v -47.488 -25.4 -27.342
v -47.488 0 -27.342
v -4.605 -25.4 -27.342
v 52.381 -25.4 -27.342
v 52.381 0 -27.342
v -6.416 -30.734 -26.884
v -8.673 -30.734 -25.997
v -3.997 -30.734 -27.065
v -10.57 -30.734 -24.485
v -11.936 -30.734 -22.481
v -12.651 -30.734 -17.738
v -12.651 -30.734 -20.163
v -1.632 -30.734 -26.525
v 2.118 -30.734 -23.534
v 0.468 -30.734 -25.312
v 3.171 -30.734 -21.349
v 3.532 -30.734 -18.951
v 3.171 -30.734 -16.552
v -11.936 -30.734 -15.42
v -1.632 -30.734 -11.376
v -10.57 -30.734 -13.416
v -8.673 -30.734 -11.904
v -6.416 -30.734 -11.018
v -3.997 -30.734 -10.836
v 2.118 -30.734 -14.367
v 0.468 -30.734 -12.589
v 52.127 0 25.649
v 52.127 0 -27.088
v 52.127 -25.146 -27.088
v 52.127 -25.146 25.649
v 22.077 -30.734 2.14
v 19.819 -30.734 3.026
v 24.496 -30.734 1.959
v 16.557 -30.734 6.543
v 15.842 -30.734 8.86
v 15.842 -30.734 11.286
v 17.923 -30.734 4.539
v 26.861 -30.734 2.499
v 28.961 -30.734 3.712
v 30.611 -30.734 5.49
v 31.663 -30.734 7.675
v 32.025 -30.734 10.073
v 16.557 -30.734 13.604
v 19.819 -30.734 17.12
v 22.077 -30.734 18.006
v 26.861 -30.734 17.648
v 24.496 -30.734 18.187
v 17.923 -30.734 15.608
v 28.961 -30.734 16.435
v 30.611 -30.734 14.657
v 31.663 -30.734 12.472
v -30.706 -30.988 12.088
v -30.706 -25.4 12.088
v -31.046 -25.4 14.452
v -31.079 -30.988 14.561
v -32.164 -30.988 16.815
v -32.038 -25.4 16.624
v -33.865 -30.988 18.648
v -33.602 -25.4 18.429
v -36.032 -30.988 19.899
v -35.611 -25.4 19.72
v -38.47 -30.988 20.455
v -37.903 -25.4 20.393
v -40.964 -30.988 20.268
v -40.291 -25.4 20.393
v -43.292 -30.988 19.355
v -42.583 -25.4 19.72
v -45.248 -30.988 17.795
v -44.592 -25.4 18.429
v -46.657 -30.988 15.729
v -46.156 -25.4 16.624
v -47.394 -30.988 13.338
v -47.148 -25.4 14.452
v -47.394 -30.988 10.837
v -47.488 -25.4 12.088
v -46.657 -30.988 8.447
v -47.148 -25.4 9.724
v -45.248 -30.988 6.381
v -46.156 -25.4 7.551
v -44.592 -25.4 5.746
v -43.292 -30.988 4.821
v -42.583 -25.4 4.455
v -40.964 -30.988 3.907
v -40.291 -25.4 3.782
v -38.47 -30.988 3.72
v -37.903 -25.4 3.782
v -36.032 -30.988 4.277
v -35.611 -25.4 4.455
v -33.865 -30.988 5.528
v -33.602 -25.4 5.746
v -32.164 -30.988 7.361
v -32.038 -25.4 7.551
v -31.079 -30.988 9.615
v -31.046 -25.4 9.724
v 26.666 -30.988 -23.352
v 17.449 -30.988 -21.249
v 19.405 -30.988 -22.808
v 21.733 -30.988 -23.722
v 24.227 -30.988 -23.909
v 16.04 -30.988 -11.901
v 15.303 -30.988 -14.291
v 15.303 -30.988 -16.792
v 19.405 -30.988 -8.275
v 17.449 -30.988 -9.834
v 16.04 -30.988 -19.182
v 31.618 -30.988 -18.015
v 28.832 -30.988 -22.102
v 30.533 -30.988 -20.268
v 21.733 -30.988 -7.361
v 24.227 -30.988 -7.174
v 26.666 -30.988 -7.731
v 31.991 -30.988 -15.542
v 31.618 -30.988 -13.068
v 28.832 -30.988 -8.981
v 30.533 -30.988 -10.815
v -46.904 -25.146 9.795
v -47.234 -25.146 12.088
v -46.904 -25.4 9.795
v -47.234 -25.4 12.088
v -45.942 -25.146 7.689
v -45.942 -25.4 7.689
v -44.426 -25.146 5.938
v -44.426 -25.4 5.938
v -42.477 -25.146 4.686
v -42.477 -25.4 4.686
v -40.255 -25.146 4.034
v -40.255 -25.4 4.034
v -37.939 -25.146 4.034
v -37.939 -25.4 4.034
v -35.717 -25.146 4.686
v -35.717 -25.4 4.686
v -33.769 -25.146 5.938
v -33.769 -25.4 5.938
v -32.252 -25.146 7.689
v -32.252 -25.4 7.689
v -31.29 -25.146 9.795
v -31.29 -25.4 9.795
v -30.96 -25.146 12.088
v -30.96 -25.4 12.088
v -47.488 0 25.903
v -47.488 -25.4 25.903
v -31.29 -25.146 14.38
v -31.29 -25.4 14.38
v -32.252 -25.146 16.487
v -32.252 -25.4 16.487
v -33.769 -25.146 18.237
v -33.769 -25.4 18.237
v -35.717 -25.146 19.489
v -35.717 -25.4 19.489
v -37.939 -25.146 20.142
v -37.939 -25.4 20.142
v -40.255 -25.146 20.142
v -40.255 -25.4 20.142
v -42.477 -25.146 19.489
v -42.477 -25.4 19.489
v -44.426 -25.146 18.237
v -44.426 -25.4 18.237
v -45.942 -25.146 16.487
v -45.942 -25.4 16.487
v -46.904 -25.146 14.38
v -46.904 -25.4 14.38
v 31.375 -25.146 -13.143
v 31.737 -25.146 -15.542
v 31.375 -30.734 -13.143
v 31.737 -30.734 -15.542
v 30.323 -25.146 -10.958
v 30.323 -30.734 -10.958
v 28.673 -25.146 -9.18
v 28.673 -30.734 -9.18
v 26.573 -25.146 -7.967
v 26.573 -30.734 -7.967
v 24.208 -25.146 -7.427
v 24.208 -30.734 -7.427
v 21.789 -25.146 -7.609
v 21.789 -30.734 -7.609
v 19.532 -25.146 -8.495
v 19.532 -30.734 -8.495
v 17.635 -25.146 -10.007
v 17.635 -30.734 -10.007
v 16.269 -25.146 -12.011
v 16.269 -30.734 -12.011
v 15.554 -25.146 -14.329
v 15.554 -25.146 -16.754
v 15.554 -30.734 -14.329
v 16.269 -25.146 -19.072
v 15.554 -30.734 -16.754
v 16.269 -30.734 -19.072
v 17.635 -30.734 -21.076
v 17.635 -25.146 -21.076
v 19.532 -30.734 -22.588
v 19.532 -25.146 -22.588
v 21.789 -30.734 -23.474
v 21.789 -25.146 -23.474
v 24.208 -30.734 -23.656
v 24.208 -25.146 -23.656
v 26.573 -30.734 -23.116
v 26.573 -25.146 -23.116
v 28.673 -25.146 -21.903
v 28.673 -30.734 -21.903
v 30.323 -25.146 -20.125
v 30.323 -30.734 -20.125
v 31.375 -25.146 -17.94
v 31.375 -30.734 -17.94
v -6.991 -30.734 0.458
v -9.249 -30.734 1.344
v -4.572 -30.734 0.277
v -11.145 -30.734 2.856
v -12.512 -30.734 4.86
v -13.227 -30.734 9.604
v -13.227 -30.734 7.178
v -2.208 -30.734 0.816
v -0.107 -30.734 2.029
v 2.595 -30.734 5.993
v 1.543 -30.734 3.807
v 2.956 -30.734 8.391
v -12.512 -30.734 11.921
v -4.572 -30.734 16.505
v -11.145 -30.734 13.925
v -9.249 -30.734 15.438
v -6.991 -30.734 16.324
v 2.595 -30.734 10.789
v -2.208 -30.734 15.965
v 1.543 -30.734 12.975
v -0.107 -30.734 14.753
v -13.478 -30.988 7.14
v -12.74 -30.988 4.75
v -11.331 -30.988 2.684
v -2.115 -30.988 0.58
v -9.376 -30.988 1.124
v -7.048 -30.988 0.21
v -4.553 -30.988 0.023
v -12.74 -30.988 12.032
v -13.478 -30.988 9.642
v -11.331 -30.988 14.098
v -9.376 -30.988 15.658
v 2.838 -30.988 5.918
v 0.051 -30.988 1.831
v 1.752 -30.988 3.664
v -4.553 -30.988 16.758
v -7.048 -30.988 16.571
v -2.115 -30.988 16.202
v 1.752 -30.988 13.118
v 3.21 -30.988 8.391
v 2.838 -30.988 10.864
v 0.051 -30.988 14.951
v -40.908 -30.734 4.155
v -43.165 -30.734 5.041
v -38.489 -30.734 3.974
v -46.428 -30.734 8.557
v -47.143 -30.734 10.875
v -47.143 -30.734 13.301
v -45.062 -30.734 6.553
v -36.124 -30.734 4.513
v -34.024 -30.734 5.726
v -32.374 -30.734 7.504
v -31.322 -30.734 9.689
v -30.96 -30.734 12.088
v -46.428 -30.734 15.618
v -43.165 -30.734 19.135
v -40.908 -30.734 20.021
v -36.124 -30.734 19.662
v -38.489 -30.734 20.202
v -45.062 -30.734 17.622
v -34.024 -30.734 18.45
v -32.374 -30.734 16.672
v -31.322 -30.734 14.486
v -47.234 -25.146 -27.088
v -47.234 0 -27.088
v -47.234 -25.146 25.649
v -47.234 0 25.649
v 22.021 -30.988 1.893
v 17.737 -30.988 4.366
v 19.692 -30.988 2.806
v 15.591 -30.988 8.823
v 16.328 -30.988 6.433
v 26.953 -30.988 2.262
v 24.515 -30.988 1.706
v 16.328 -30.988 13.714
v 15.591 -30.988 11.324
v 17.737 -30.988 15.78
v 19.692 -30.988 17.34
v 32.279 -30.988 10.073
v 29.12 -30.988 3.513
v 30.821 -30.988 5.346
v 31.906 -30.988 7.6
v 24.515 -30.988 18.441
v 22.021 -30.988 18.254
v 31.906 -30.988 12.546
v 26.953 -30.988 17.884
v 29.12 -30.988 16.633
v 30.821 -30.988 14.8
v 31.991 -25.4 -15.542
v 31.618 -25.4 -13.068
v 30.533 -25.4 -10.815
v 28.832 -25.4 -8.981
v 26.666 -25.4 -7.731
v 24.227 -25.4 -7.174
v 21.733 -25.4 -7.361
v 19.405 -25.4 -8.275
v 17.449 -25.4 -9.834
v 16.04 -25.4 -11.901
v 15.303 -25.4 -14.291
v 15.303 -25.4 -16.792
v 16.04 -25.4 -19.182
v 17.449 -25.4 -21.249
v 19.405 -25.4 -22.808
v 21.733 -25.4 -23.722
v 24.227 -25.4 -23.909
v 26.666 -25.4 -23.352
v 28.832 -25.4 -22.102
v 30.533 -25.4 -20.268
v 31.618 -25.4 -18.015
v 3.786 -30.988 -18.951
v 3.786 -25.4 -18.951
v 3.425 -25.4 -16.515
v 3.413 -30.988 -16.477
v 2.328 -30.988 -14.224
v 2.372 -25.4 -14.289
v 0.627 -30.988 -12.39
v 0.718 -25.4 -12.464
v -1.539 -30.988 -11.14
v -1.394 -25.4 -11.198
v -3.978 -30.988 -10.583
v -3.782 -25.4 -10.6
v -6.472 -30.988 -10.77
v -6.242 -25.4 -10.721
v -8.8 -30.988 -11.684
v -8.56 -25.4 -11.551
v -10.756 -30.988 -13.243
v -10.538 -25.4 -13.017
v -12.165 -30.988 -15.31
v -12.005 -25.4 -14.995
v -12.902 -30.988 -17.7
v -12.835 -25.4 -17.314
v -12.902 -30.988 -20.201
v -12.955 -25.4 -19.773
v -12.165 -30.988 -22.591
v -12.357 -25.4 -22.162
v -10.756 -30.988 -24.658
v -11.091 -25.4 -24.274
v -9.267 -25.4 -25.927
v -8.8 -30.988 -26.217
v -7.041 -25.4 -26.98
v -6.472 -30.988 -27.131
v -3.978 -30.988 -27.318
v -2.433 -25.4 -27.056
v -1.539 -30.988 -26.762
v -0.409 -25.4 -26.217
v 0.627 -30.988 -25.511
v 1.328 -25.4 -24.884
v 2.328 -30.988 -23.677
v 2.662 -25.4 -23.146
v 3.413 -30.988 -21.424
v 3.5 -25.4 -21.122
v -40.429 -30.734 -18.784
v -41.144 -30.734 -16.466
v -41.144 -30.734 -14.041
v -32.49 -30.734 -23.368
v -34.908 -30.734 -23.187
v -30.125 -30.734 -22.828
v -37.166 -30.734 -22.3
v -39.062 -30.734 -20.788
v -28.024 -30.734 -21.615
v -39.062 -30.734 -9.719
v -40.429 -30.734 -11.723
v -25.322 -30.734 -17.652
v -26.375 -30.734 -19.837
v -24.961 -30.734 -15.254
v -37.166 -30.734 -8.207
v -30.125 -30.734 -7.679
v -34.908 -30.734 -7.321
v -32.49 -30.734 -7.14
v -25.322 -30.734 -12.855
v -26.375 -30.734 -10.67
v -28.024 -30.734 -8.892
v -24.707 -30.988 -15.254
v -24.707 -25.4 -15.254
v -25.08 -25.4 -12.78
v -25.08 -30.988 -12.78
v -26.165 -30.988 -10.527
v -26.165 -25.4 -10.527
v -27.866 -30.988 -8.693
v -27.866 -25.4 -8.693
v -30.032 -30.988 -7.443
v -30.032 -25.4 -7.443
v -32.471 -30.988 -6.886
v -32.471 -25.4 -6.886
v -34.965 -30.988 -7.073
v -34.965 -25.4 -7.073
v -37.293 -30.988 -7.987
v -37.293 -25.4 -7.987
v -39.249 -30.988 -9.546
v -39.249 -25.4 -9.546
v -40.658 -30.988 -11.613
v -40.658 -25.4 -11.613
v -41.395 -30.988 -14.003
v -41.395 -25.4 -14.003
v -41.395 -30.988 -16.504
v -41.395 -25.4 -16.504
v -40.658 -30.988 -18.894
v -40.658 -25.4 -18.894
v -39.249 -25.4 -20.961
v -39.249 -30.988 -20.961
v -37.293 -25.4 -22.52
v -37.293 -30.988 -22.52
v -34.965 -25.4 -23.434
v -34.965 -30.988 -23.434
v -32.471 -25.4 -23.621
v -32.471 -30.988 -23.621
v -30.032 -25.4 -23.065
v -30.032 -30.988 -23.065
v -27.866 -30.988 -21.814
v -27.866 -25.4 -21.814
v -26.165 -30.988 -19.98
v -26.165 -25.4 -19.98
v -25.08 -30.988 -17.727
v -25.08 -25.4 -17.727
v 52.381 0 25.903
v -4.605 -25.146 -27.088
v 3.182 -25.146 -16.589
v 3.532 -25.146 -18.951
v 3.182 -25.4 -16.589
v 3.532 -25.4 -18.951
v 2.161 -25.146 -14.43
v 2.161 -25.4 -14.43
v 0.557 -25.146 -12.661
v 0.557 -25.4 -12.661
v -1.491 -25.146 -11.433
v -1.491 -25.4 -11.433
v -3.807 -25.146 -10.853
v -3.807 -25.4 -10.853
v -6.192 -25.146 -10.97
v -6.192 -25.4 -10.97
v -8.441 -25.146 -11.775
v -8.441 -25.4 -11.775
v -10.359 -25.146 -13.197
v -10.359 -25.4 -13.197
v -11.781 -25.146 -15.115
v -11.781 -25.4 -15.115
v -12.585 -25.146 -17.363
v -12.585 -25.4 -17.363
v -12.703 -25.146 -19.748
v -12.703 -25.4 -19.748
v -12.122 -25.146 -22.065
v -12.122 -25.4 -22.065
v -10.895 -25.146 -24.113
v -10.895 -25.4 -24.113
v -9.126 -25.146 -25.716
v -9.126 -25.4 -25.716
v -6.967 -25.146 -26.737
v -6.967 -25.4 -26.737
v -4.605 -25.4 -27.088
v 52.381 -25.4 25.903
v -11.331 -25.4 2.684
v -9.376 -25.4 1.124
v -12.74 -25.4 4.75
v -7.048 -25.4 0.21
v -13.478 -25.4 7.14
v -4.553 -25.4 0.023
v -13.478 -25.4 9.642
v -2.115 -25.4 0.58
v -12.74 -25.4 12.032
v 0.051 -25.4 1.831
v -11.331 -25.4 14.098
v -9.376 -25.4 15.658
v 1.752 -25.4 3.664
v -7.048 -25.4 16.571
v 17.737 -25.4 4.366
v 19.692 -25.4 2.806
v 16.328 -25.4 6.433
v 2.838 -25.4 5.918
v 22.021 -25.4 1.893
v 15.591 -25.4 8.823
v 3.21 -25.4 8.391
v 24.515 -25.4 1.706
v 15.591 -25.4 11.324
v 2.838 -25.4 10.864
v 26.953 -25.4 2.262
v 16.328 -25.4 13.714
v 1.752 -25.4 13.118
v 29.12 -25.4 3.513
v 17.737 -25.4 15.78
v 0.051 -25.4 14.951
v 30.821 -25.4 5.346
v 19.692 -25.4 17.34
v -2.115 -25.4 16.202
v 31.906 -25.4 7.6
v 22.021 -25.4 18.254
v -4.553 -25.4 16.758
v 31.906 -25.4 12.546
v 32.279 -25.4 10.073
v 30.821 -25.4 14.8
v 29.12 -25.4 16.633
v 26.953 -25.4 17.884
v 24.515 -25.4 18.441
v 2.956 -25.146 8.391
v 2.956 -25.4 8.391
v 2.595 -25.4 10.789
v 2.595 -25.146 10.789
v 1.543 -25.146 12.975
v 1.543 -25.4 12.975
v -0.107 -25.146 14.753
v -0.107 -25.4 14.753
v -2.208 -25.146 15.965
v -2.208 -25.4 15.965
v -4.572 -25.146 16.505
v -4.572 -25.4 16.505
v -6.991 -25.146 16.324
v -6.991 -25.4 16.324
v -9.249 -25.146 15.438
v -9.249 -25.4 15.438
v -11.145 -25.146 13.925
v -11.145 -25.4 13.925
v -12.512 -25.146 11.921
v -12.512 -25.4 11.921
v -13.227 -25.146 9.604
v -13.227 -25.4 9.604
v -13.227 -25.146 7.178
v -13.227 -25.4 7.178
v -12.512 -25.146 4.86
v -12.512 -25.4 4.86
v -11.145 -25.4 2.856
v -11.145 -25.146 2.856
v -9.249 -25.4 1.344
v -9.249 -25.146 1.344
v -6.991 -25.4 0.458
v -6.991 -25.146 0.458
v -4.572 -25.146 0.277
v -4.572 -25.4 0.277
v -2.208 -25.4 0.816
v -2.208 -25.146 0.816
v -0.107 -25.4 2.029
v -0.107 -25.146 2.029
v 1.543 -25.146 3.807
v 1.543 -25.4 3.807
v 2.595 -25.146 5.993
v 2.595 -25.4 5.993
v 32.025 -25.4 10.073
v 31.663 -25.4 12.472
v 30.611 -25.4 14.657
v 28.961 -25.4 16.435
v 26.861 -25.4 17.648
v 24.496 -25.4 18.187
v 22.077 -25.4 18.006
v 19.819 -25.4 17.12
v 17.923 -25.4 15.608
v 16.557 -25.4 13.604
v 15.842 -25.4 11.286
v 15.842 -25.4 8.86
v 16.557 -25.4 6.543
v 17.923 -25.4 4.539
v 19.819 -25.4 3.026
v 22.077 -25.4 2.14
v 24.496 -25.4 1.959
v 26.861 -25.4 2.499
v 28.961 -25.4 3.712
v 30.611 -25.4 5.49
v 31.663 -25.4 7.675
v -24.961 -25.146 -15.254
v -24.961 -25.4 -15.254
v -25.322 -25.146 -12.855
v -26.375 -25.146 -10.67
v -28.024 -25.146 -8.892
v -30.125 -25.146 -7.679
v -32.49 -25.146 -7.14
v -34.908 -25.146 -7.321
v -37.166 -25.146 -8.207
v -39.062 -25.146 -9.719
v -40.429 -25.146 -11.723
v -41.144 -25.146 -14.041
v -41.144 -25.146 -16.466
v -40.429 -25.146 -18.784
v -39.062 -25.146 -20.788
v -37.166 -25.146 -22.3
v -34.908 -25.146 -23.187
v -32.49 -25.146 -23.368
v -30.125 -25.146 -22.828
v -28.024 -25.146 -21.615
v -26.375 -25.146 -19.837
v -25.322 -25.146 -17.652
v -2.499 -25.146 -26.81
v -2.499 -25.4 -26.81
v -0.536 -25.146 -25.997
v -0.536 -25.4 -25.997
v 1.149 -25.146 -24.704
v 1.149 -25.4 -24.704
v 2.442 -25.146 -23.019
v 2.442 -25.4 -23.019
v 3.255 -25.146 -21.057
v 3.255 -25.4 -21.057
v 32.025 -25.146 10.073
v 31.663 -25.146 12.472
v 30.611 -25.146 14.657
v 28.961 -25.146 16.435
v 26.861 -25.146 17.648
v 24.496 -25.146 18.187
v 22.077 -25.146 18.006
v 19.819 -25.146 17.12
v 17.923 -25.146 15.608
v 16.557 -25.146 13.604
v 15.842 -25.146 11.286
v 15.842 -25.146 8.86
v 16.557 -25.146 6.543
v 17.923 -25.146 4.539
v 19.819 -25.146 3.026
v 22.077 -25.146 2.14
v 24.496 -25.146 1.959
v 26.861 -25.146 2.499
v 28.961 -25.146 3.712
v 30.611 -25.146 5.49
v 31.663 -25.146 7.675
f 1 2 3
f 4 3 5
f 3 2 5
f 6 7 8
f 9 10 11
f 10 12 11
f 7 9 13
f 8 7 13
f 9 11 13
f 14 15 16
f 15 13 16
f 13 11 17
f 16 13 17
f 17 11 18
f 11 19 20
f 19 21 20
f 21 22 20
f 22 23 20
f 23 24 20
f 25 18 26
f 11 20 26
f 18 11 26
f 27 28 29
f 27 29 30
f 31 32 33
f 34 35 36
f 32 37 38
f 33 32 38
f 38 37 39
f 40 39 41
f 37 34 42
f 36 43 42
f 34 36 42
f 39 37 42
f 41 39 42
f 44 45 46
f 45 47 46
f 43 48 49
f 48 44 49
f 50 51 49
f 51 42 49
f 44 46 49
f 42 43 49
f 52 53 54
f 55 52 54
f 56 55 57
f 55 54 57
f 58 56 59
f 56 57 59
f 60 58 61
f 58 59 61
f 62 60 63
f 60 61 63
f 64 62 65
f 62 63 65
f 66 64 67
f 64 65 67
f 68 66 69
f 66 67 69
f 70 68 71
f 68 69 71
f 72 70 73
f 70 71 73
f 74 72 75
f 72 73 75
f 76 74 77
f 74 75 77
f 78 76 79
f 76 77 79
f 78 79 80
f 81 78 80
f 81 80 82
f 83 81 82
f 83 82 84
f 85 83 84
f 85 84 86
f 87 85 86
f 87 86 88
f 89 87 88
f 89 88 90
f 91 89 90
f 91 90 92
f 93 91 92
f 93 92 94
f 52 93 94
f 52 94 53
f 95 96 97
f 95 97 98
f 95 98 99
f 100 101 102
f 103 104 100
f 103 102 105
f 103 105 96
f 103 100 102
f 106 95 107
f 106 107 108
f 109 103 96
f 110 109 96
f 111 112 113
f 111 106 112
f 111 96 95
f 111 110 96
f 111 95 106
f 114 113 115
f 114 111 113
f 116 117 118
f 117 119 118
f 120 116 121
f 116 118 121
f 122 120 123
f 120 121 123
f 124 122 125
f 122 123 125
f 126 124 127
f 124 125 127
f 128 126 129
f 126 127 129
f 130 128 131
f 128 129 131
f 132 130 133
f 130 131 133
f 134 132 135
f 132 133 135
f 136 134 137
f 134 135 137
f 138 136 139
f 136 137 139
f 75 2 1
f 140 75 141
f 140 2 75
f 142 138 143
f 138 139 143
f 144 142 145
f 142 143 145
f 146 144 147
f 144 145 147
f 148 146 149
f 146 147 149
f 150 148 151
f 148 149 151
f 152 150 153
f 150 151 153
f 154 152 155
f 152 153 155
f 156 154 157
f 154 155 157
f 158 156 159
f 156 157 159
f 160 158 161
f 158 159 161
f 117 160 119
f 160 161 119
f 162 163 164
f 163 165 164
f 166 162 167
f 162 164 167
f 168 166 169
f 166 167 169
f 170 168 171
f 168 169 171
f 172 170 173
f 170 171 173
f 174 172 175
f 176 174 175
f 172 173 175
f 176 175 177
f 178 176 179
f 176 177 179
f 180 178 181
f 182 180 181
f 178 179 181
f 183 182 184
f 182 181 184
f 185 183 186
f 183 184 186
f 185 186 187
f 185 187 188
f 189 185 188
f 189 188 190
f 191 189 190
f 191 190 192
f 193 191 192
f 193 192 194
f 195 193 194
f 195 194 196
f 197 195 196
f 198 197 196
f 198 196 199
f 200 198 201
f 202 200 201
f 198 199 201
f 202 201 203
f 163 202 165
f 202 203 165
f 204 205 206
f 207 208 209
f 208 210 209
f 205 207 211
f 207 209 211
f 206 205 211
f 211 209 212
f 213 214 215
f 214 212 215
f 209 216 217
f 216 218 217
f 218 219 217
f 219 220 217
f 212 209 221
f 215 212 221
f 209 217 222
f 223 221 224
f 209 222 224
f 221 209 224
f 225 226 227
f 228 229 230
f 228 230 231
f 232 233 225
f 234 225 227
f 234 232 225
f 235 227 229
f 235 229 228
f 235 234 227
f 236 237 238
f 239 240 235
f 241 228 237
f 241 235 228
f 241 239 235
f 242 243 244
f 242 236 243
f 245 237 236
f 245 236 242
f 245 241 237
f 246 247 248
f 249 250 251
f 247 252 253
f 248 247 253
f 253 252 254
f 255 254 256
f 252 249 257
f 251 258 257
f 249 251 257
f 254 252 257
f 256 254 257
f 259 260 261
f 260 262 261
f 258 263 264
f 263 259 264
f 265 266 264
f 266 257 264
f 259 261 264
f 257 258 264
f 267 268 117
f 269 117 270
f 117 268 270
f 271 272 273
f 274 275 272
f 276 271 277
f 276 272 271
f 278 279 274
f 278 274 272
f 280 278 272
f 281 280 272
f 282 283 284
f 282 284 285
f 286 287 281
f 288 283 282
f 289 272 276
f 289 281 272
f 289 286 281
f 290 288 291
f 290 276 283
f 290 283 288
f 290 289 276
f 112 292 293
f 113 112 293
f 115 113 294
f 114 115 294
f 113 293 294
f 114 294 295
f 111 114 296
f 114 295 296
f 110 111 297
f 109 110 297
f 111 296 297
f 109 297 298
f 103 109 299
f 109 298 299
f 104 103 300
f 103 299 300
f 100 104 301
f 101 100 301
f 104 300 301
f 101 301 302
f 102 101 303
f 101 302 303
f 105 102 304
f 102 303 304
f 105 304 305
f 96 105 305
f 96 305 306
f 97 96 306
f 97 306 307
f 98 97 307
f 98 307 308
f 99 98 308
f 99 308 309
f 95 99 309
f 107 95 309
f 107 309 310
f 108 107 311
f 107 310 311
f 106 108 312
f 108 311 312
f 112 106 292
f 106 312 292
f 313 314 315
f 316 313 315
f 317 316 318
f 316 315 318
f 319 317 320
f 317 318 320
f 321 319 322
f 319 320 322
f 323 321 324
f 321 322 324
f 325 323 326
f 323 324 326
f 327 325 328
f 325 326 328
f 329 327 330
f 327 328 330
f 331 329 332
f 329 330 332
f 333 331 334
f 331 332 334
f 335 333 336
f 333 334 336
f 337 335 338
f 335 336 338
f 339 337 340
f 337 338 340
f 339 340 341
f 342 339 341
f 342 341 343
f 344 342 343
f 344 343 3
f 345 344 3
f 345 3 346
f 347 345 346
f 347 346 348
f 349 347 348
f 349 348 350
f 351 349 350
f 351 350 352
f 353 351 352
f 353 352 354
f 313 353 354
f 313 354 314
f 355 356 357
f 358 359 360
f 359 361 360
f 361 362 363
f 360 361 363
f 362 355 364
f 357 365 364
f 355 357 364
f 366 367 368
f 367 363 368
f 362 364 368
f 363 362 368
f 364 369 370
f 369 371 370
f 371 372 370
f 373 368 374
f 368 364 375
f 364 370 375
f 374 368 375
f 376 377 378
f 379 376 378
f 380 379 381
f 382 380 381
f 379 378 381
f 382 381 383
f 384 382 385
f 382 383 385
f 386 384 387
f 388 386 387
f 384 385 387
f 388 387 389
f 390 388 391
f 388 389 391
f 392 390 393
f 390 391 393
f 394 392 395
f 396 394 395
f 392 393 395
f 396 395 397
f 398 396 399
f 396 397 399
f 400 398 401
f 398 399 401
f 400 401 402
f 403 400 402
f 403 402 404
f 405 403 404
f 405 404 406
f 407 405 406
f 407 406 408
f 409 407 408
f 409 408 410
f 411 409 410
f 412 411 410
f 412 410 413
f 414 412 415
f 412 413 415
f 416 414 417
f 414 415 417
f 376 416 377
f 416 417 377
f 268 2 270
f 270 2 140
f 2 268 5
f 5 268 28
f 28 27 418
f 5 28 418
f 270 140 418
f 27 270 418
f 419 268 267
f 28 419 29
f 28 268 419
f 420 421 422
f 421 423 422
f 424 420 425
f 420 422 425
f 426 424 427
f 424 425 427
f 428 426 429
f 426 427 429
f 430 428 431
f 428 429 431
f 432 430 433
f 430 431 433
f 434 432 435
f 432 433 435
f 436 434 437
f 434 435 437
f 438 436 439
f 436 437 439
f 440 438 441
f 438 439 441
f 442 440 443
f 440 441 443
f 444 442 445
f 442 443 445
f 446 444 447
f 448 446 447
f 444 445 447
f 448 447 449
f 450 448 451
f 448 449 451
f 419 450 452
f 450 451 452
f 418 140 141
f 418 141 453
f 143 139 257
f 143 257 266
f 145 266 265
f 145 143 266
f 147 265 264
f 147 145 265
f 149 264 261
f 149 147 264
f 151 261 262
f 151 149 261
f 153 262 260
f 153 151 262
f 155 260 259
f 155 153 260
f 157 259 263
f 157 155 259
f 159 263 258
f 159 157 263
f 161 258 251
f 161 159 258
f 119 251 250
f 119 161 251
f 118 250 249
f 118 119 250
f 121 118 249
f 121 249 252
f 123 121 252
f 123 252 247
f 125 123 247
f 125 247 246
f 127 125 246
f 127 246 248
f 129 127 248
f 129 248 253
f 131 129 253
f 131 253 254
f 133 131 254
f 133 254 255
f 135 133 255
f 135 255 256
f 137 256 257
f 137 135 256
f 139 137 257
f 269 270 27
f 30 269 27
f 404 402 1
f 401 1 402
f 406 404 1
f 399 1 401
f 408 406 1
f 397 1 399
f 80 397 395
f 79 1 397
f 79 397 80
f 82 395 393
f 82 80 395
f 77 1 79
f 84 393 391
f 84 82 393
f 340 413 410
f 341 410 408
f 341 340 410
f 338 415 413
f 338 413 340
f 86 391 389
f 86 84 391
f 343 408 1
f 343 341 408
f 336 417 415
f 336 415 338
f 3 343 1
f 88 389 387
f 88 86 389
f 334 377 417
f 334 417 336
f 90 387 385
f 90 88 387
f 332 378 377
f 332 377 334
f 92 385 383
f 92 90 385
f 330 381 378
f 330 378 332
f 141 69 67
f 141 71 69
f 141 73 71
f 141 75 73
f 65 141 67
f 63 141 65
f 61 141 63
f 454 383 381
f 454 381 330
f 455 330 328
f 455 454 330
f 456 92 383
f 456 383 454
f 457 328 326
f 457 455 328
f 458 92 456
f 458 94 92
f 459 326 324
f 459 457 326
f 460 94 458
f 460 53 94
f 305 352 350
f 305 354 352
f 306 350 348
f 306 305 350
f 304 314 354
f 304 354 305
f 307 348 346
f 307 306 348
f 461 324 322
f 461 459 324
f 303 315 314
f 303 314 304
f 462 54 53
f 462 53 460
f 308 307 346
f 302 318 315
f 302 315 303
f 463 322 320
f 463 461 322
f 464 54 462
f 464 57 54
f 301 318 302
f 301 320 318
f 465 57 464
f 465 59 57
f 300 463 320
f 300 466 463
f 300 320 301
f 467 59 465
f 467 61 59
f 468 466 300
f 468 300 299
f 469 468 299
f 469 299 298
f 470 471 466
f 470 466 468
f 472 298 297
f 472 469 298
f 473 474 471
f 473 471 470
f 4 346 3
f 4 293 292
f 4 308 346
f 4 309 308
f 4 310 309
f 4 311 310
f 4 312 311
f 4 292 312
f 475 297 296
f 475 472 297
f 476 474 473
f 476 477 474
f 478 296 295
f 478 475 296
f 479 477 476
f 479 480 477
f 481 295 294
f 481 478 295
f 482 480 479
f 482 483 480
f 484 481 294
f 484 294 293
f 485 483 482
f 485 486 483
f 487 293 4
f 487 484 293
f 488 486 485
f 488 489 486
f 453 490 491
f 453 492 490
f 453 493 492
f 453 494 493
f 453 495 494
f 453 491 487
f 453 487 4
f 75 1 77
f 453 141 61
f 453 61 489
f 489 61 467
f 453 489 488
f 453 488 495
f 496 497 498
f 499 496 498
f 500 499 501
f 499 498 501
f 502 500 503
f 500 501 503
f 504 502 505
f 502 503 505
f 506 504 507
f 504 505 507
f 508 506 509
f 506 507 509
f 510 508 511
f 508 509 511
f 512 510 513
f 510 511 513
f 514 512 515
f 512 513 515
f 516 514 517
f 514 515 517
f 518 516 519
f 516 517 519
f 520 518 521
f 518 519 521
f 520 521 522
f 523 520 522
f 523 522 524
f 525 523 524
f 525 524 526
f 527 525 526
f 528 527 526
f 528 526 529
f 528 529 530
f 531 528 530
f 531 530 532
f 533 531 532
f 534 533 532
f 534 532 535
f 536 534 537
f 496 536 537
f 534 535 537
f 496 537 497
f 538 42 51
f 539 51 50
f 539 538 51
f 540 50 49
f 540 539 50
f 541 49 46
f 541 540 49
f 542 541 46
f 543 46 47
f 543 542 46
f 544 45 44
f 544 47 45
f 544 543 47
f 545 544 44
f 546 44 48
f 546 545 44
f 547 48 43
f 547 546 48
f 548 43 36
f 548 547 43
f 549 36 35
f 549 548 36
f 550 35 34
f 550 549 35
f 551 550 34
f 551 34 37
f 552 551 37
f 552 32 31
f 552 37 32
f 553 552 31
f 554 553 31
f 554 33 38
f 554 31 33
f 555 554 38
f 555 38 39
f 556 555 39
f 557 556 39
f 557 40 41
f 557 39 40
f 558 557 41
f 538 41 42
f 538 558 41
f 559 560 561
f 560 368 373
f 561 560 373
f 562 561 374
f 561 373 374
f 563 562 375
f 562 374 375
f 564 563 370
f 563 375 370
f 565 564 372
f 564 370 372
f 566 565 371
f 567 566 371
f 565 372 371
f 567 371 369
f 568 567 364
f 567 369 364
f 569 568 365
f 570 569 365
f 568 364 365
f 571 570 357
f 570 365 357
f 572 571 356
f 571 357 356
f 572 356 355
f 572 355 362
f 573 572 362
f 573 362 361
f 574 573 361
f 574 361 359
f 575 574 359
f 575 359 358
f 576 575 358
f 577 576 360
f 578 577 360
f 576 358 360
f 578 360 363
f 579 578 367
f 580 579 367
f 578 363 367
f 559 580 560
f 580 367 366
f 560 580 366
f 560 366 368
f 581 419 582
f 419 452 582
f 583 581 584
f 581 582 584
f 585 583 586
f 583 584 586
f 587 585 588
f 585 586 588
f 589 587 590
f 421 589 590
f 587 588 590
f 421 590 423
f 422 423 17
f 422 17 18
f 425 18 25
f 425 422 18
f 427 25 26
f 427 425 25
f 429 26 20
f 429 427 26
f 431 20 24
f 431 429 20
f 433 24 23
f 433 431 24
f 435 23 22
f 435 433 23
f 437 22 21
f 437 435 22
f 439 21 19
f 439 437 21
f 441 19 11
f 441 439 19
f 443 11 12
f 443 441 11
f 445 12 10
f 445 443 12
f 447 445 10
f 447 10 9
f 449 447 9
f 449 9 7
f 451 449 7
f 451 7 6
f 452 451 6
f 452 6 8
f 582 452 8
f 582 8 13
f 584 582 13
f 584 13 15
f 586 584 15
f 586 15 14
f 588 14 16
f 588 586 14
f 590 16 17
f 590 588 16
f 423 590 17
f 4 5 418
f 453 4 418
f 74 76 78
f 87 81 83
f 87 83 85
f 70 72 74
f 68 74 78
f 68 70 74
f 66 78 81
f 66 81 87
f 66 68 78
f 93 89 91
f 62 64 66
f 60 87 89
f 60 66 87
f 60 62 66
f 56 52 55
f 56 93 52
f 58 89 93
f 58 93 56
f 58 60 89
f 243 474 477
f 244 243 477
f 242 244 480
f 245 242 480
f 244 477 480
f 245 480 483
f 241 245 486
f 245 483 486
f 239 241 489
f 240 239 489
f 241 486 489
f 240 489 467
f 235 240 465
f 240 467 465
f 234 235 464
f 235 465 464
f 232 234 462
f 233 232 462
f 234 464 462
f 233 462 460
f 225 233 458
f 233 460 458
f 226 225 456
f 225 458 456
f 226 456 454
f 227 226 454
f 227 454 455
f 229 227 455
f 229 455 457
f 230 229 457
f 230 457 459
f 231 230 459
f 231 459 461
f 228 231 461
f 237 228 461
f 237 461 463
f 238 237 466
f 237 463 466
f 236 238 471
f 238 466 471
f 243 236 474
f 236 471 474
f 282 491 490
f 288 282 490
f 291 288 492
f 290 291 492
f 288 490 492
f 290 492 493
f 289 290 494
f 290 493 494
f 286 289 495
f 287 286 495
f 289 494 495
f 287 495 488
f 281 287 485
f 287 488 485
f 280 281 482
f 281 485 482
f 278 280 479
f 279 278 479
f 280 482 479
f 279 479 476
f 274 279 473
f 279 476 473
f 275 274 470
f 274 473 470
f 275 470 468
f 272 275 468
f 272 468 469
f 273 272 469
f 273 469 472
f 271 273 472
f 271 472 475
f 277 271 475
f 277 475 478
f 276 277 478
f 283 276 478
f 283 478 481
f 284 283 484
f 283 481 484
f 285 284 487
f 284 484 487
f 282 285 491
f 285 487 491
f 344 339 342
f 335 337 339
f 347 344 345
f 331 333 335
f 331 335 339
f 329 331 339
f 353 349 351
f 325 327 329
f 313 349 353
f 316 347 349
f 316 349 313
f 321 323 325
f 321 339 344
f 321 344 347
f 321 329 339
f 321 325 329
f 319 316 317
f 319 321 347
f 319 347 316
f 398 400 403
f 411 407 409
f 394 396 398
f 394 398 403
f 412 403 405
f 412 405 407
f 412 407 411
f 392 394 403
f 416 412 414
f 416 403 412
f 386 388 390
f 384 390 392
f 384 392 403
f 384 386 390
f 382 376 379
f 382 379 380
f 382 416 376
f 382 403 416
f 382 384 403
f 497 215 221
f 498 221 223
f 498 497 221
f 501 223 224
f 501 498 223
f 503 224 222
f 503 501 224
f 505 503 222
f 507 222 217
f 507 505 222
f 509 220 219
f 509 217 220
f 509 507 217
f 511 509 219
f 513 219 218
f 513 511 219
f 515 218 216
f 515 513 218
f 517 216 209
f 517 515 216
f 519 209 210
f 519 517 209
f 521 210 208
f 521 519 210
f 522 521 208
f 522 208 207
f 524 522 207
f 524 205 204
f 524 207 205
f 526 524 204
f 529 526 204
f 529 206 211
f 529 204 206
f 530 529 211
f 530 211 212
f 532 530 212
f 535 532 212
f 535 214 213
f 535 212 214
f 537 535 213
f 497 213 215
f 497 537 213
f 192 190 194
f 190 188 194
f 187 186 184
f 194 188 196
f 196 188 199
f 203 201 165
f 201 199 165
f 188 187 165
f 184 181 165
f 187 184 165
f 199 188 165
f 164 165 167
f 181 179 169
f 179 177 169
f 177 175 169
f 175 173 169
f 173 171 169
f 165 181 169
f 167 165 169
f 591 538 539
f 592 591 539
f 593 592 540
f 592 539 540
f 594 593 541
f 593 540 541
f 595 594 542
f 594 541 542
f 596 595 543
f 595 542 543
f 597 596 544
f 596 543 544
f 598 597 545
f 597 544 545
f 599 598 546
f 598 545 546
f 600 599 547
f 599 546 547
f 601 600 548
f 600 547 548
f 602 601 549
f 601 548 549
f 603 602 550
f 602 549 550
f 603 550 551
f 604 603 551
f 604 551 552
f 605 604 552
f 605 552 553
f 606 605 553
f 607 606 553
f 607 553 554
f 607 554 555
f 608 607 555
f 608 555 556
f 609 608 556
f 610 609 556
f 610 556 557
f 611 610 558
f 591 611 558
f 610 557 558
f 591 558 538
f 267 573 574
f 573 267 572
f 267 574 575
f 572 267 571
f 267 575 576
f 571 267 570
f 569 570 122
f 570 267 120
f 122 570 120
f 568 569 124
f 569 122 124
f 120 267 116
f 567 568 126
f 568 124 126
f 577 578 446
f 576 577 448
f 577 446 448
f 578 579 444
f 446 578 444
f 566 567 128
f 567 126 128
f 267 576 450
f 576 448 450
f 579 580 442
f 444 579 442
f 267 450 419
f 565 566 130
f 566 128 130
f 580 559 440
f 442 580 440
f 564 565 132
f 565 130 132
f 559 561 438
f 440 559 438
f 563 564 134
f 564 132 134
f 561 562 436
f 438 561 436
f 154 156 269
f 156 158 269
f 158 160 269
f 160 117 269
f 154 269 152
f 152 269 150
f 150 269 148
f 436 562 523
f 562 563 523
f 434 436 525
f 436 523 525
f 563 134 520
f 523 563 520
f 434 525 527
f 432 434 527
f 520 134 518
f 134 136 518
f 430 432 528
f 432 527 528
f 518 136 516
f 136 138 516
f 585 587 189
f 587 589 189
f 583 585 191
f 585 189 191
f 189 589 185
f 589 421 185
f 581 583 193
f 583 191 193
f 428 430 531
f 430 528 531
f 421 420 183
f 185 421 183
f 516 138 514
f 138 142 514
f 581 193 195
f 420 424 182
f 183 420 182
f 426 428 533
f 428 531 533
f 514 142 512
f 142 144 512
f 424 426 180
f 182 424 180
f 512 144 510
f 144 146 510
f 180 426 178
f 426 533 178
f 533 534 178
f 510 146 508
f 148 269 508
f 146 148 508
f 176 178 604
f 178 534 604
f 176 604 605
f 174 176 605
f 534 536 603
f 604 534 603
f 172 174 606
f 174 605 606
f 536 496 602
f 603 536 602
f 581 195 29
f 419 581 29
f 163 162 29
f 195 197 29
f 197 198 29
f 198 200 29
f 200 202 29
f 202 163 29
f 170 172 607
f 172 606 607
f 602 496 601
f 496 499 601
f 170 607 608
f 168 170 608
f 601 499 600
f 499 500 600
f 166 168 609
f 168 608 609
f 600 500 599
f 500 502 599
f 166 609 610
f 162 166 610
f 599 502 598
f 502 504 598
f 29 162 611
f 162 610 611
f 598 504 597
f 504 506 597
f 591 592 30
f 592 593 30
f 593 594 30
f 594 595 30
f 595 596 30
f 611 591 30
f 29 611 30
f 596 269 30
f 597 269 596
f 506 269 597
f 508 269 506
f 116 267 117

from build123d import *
from build123d import SkipClean  # not in build123d's __all__

# Parameters (mm, degrees)
F0_W         = 99.8685993254
F0_H         = 53.244067356
F1_DEPTH     = 25.4
F2_R         = 8.3909074383
F3_DEPTH     = 5.588
F4_T         = 0.254
F4_T6_ANGLE  = 90.000000253
F4_T8_ANGLE  = 269.999999749
F4_T12_ANGLE = 180.000000001
F4_T14_ANGLE = 180.000000001


# Not quite as in the source:
# - a shell that OpenCascade refuses in one call is made with other operations: the cavity is built on its own and cut out


with BuildPart() as f1:
    # F0 (on Front) → F1 (new body)
    with BuildSketch(Plane.XZ):
        with Locations((2.4463478476, -0.7195146754)):
            Rectangle(F0_W, F0_H)
    extrude(amount=F1_DEPTH)

    # F2 (on face) → F3 (join)
    with BuildSketch(Plane.XZ.offset(25.4)):
        with Locations((-5.1805051044, 8.3909074383)):
            Circle(F2_R)
        with Locations((23.8878745586, 10.0732017308)):
            Circle(F2_R)
        with Locations((23.600069806, -15.5415115878)):
            Circle(F2_R)
        with Locations((-4.6048937365, -18.9506409151)):
            Circle(F2_R)
        with Locations((-33.0976620317, -15.2537049726)):
            Circle(F2_R)
        with Locations((-39.0970443768, 12.0878415182)):
            Circle(F2_R)
    extrude(amount=F3_DEPTH)

    # F4: shell of thickness 0.254, made by hand


with BuildPart() as f4_core1:
    # F4_t2: copy of F1
    add(f1.part, clean=False)

    # the walls: a layer under each face that stays
    f4_faces = [f4_core1.faces().sort_by_distance(p)[0] for p in [
        (-47.4879518151, -12.7, -0.7195146754),
        (2.4463478476, -12.7, 25.9025190026),
        (2.4463478476, -12.7, -27.3415483534),
        (2.4463478476, -25.4, -0.7195146754),
        (52.3806475103, -12.7, -0.7195146754),
        (-41.48856947, -28.194, -15.2537049726),
        (-12.9958011749, -28.194, -18.9506409151),
        (15.2091623677, -28.194, -15.5415115878),
        (-47.4879518151, -28.194, 12.0878415182),
        (-13.5714125427, -28.194, 8.3909074383),
        (15.4969671202, -28.194, 10.0732017308),
        (-33.0976620317, -30.988, -15.2537049726),
        (-4.6048937365, -30.988, -18.9506409151),
        (23.600069806, -30.988, -15.5415115878),
        (-39.0970443768, -30.988, 12.0878415182),
        (-5.1805051044, -30.988, 8.3909074383),
        (23.8878745586, -30.988, 10.0732017308),
    ]]
    thicken(f4_faces, amount=-F4_T, mode=Mode.SUBTRACT)

    # F4_s3 → F4_t4 (revolve, cut)
    with BuildSketch(Plane.XY.offset(-15.2537049726)):
        Polygon((-24.7042145933, -25.40254), (-24.7067545933, -25.146), (-24.9607545933, -25.146), (-24.9607545933, -25.4), align=None)
    revolve(axis=Axis((-33.0976620317, -25.4, -15.2537049726), (0, -1, 0)), mode=Mode.SUBTRACT)

    # F4_s5 → F4_t6 (revolve, cut)
    with BuildSketch(Plane.YZ.offset(-4.6048937365)):
        Polygon((-25.40254, -27.3440883534), (-25.146, -27.3415483534), (-25.146, -27.0875483534), (-25.4, -27.0875483534), align=None)
    revolve(axis=Axis((-4.6048937365, -25.4, -18.9506409151), (0, -1, 0)), revolution_arc=F4_T6_ANGLE, mode=Mode.SUBTRACT)

    # F4_s7 → F4_t8 (revolve, cut)
    with BuildSketch(Plane.XY.offset(-18.9506409151)):
        Polygon((3.7885537018, -25.40254), (3.7860137018, -25.146), (3.5320137018, -25.146), (3.5320137018, -25.4), align=None)
    revolve(axis=Axis((-4.6048937365, -25.4, -18.9506409151), (0, -1, 0)), revolution_arc=F4_T8_ANGLE, mode=Mode.SUBTRACT)

    # F4_s9 → F4_t10 (revolve, cut)
    with BuildSketch(Plane.XY.offset(-15.5415115878)):
        Polygon((31.9935172443, -25.40254), (31.9909772443, -25.146), (31.7369772443, -25.146), (31.7369772443, -25.4), align=None)
    revolve(axis=Axis((23.600069806, -25.4, -15.5415115878), (0, -1, 0)), mode=Mode.SUBTRACT)

    # F4_s11 → F4_t12 (revolve, cut)
    with BuildSketch(Plane.XY.offset(12.0878415182)):
        Polygon((-47.4904918151, -25.40254), (-47.4879518151, -25.146), (-47.2339518151, -25.146), (-47.2339518151, -25.4), align=None)
    with SkipClean():  # cleaning this boolean's faces spoils the solid; the shape is the same uncleaned
        revolve(axis=Axis((-39.0970443768, -25.4, 12.0878415182), (0, -1, 0)), revolution_arc=F4_T12_ANGLE, mode=Mode.SUBTRACT)

    # F4_s13 → F4_t14 (revolve, cut)
    with BuildSketch(Plane.XY.offset(12.0878415182)):
        Polygon((-30.7035969385, -25.40254), (-30.7061369385, -25.146), (-30.9601369385, -25.146), (-30.9601369385, -25.4), align=None)
    revolve(axis=Axis((-39.0970443768, -25.4, 12.0878415182), (0, -1, 0)), revolution_arc=F4_T14_ANGLE, mode=Mode.SUBTRACT)

    # F4_s15 → F4_t16 (revolve, cut)
    with BuildSketch(Plane.XY.offset(8.3909074383)):
        Polygon((3.212942334, -25.40254), (3.210402334, -25.146), (2.956402334, -25.146), (2.956402334, -25.4), align=None)
    revolve(axis=Axis((-5.1805051044, -25.4, 8.3909074383), (0, -1, 0)), mode=Mode.SUBTRACT)

    # F4_s17 → F4_t18 (revolve, cut)
    with BuildSketch(Plane.XY.offset(10.0732017308)):
        Polygon((32.2813219969, -25.40254), (32.2787819969, -25.146), (32.0247819969, -25.146), (32.0247819969, -25.4), align=None)
    revolve(axis=Axis((23.8878745586, -25.4, 10.0732017308), (0, -1, 0)), mode=Mode.SUBTRACT)


with BuildPart() as f1_1:
    add(f1.part, clean=False)

    # what is left inside the walls is the cavity
    f4_cavity = [f4_core1.part.solids().sort_by_distance(p)[0] for p in [
        (2.446348, -0.00254, -9.508859),
    ]]
    add(f4_cavity, mode=Mode.SUBTRACT)


solid = f1_1.part
